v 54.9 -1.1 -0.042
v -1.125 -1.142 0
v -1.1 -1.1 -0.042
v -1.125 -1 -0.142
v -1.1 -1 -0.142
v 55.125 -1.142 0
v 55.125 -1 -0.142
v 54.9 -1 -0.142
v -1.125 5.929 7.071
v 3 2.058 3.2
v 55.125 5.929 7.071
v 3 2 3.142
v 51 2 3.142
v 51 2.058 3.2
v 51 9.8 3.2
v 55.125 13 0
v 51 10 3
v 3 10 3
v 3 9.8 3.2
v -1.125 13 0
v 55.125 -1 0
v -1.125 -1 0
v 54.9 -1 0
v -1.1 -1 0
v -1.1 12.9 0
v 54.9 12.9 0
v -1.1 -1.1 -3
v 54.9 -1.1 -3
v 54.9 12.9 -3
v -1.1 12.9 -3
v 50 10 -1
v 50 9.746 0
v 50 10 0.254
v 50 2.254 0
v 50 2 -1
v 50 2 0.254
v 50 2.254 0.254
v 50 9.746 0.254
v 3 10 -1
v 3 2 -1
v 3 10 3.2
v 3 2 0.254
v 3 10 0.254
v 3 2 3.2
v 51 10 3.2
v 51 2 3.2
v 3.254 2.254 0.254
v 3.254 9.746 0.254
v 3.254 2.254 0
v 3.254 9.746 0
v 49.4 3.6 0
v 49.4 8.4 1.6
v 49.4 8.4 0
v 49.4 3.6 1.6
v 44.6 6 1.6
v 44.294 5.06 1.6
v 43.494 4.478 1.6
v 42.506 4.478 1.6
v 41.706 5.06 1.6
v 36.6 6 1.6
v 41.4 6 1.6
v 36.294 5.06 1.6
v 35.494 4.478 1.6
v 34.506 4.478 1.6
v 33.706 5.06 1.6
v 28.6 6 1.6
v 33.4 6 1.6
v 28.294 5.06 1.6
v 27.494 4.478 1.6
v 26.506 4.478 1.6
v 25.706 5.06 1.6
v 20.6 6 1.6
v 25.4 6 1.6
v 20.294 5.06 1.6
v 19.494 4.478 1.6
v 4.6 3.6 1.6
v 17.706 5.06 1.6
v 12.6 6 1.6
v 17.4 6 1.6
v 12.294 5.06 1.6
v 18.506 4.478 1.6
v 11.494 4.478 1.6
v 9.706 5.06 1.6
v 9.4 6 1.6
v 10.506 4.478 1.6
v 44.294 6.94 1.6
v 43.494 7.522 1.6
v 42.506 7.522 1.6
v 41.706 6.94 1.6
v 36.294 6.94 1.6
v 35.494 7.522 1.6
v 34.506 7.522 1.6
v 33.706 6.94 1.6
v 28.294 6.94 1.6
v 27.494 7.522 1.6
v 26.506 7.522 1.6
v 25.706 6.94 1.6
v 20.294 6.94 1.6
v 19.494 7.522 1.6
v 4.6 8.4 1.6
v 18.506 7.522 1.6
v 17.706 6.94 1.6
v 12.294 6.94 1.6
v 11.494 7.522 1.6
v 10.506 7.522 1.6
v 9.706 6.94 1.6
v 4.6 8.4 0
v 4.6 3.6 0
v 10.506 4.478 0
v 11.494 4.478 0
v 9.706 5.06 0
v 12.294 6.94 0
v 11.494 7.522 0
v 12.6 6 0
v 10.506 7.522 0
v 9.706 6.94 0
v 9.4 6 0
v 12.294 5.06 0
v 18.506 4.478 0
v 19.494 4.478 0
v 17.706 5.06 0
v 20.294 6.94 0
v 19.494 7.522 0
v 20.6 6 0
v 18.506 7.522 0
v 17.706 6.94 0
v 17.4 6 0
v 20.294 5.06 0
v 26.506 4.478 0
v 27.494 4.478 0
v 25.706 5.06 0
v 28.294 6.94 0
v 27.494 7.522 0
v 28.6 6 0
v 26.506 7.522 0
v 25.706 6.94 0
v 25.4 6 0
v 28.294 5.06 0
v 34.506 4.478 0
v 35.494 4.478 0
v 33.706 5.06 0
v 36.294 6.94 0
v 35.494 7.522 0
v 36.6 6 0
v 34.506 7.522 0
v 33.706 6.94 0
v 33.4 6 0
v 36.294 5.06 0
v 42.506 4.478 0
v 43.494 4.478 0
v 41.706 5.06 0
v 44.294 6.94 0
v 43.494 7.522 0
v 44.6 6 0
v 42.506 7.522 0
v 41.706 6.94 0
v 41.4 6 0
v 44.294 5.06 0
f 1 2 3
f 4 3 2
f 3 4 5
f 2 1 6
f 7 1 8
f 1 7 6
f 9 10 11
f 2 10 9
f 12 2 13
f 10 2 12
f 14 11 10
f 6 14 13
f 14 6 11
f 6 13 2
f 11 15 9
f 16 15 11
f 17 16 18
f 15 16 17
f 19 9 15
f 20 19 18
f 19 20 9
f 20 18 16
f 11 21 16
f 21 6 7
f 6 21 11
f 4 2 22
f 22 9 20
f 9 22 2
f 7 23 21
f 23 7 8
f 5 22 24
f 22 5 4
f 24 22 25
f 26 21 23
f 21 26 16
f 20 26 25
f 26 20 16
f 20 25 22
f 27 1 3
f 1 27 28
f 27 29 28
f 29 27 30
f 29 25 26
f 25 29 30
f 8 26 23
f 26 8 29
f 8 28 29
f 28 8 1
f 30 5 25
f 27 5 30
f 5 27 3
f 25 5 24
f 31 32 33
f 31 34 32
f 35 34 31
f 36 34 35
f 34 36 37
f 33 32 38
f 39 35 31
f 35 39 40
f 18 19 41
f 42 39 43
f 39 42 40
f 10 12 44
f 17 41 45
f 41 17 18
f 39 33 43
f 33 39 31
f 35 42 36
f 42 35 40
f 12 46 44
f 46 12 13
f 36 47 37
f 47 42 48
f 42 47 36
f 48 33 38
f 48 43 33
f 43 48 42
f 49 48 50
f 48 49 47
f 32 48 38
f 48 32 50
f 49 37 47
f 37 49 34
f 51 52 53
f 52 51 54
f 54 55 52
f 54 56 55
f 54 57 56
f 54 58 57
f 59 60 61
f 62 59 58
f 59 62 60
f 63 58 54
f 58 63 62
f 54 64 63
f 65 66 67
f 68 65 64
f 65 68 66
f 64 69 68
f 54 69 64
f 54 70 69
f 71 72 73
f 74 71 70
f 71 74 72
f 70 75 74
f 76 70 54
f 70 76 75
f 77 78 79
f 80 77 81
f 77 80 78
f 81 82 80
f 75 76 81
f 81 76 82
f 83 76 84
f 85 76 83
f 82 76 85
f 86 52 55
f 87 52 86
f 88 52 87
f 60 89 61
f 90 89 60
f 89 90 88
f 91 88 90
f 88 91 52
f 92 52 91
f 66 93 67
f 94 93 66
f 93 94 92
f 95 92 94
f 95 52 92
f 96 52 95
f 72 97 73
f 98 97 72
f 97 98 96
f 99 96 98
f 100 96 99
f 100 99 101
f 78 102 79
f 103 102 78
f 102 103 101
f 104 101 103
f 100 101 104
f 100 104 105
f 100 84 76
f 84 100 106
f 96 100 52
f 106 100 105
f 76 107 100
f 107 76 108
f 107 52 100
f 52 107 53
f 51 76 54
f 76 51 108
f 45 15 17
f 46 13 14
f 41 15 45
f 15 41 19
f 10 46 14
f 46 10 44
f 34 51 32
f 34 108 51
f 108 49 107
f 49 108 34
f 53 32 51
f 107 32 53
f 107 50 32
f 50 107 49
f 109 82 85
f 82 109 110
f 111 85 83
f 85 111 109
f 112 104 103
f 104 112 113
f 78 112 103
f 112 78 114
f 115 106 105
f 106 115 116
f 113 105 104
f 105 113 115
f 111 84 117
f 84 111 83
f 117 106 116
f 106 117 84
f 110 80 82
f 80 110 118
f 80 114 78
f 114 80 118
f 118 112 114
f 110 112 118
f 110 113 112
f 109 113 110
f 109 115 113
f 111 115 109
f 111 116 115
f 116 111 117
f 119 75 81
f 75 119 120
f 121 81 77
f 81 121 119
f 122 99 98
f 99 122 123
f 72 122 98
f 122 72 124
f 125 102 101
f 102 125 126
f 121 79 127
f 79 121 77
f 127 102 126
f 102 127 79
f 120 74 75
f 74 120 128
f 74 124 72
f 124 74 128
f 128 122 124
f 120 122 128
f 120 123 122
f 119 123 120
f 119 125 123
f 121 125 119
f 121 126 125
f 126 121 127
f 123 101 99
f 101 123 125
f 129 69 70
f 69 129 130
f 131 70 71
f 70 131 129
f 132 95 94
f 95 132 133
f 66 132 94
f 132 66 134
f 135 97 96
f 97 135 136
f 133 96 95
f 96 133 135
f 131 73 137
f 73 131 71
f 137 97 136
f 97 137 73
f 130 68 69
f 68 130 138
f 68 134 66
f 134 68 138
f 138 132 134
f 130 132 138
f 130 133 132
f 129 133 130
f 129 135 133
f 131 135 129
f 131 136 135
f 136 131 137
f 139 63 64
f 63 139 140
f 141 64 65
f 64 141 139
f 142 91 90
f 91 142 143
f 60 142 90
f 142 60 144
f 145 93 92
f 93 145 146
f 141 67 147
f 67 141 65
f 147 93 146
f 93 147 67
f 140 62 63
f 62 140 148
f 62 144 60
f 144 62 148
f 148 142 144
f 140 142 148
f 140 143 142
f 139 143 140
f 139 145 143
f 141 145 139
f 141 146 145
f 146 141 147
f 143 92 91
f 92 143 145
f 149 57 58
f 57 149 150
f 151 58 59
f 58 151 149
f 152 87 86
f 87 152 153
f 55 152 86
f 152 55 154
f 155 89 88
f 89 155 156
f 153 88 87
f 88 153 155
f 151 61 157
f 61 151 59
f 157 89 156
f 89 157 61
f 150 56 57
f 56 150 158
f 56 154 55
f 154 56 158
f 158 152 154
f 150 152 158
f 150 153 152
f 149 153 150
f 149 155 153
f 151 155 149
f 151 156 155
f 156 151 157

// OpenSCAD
// file: ../OpenSCAD/brailleAndText.scad
/*
Braille Module
http://creativecommons.org/licenses/by/3.0/
*/


// mm sizes from http://dots.physics.orst.edu/gs_layout.html
radius = 0.25;
spacing = 2.5;
startOffset = 3.75;
distance = startOffset + spacing;

plate_height = 10;
plate_thickness = 10;   // was 2.

$fn = 10;



module letter(bitmap, char) {
//    echo(char);
	row_size = 2;
	col_size = 3;
	bitmap_size = row_size * col_size;
	
	function loc_x(loc) = floor(loc / row_size) * spacing + spacing;
	function loc_y(loc) = loc % row_size * spacing  + (distance-spacing)/2;

    translate([0, loc_y(-1), -2]) {
        rotate([270, 0, 90]) {
            linear_extrude(height = 1.25)
            text(char, 6);
        }
    }
	
    for (loc = [0:bitmap_size - 1]) {
		if (bitmap[loc] != 0) {
			union() {
				translate(v = [loc_x(loc), loc_y(loc), 0]) {
					sphere(radius = radius* bitmap[loc], center = true);
				}
			}
		}
	}
}


module braille_char(char) {
	if (char == "A" || char == "a") {
		letter([
			1,0,
			0,0,
			0,0
		], char);
	} else if (char == "B" || char == "b") {
		letter([
			1,0,
			1,0,
			0,0
		], char);
	} else if (char == "C" || char == "c") {
		letter([
			1,1,
			0,0,
			0,0
		], char);
	} else if (char == "D" || char == "d") {
		letter([
			1,1,
			0,1,
			0,0
		], char);
	} else if (char == "E" || char == "e") {
		letter([
			1,0,
			0,1,
			0,0
		], char);
	} else if (char == "F" || char == "f") {
		letter([
			1,1,
			1,0,
			0,0
		], char);
	} else if (char == "G" || char == "g") {
		letter([
			1,1,
			1,1,
			0,0
		], char);
	} else if (char == "H" || char == "h") {
		letter([
			1,0,
			1,1,
			0,0
		], char);
	} else if (char == "I" || char == "i") {
		letter([
			0,1,
			1,0,
			0,0
		], char);
	} else if (char == "J" || char == "j") {
		letter([
			0,1,
			1,1,
			0,0
		], char);
	} else if (char == "K" || char == "k") {
		letter([
			1,0,
			0,0,
			1,0
		], char);
	} else if (char == "L" || char == "l") {
		letter([
			1,0,
			1,0,
			1,0
		], char);
	} else if (char == "M" || char == "m") {
		letter([
			1,1,
			0,0,
			1,0
		], char);
	} else if (char == "N" || char == "n") {
		letter([
			1,1,
			0,1,
			1,0
		], char);
	} else if (char == "O" || char == "o") {
		letter([
			1,0,
			0,1,
			1,0
		], char);
	} else if (char == "P" || char == "p") {
		letter([
			1,1,
			1,0,
			1,0
		], char);
	} else if (char == "Q" || char == "q") {
		letter([
			1,1,
			1,1,
			1,0
		], char);
	} else if (char == "R" || char == "r") {
		letter([
			1,0,
			1,1,
			1,0
		], char);
	} else if (char == "S" || char == "s") {
		letter([
			0,1,
			1,0,
			1,0
		], char);
	} else if (char == "T" || char == "t") {
		letter([
			0,1,
			1,1,
			1,0
		], char);
	} else if (char == "U" || char == "u") {
		letter([
			1,0,
			0,0,
			1,1
		], char);
	} else if (char == "V" || char == "v") {
		letter([
			1,0,
			1,1,
			1,0
		], char);
	} else if (char == "W" || char == "w") {
		letter([
			0,1,
			1,1,
			0,1
		], char);
	} else if (char == "X" || char == "x") {
		letter([
			1,1,
			0,0,
			1,1
		], char);
	} else if (char == "Y" || char == "y") {
		letter([
			1,1,
			0,1,
			1,1
		], char);
	} else if (char == "Z" || char == "z") {
		letter([
			1,0,
			0,1,
			1,1
		], char);
    } else if (char == " ") {
		letter([
			0,0,
			0,0,
			0,0
		], char);
	} else {
		echo("Invalid Character: ", char);
	}

}

module braille_str(chars) {
    char_count = len(chars);
	echo(str("Total Width of ", chars, " : ",  distance * char_count, "mm"));
	union() {
		for (count = [0:char_count-1]) {
			translate(v = [0, count * distance, plate_thickness]) {
				braille_char(chars[count]);
			}
		}
		translate(v = [0, -distance/2, 0]) {
			color([0,0,1]) {
				cube(size = [plate_height, distance * (char_count+1), plate_thickness]);
			}
            }                                                      
	}
}

function lenText(txt="Hi") = distance * len(txt);

module printTextAndBraille(textToPrint) {
    blockLen = lenText(textToPrint);
    union()
    {
        difference() {                      // remove second box from first
            rotate([0,45,0]) {              // make it on its edge
                braille_str((textToPrint)); // make a long box
            }
            translate([0, -3.25, -8]) {     // move in right place
                cube(size = [14, (blockLen+8), 8]);
            }
        } 
        translate([0.1, -3.1, -3]) {     // move in right place
            cube(size = [14, (blockLen+6), 3]); 
        }
    }                                 
}

printTextAndBraille("HELLO CalLUM");
// file: ../openSCADLibs/lego_brick_builder.scad
/*

 Basic Lego brick builder module for OpenScad by Jorg Janssen 2013 (CC BY-NC 3.0) 
 To use this in your own projects add:

 use <path_to_this_file/lego_brick_builder.scad>
 brick (length, width, height [,smooth]);

 Length and width are in standard lego brick dimensions. 
 Height is in flat brick heights, so for a normal lego brick height = 3.
 Add optional smooth = true for a brick without studs. 
 Use height = 0 to just put studs/knobs on top of other things.

 */
$fn = 150;

// and this is how it's done:

FLU = 1.6; // Fundamental Lego Unit = 1.6 mm

BRICK_WIDTH = 5*FLU; // basic brick width
BRICK_HEIGHT = 6*FLU; // basic brick height
PLATE_HEIGHT = 2*FLU; // basic plate height
WALL_THICKNESS = FLU; // outer wall of the brick
STUD_RADIUS = 1.5*FLU; // studs are the small cylinders on top of the brick with the lego logo ('nopje' in Dutch)
STUD_HEIGHT = FLU; 
ANTI_STUD_RADIUS = 0.5*4.07*FLU;  // an anti stud is the hollow cylinder inside bricks that have length > 1 and width > 1
PIN_RADIUS = FLU; // a pin is the small cylinder inside bricks that have length = 1 or width = 1
SUPPORT_THICKNESS = 0.254; // support is the thin surface between anti studs, pins and walls, your printer might not print this thin, try thicker!
EDGE = 0.254; // this is the width and height of the bottom line edge of smooth bricks
CORRECTION = 0.1; // addition to each size, to make sure all parts connect by moving them a little inside each other

module brick(length = 4, width = 2, height = 3, smooth = false){

	// brick shell
	difference(){
		cube(size = [length*BRICK_WIDTH,width*BRICK_WIDTH,height*PLATE_HEIGHT]);
		translate([WALL_THICKNESS,WALL_THICKNESS,-WALL_THICKNESS])
		union(){
			cube(size = [length*BRICK_WIDTH-2*WALL_THICKNESS,width*BRICK_WIDTH-2*WALL_THICKNESS,height*PLATE_HEIGHT]);
			// stud inner holes, radius = pin radius
			if (!smooth) {
				translate([STUD_RADIUS+WALL_THICKNESS,STUD_RADIUS+WALL_THICKNESS,height*PLATE_HEIGHT])
				for (y = [0:width-1]){
					for (x = [0:length-1]){
						translate ([x*BRICK_WIDTH-WALL_THICKNESS,y*BRICK_WIDTH-WALL_THICKNESS,-CORRECTION])
						cylinder(h=WALL_THICKNESS+2*CORRECTION,r=PIN_RADIUS);
					}
				}
			}
			// small bottom line edge for smooth bricks
			else {
				translate([-WALL_THICKNESS-CORRECTION,-WALL_THICKNESS-CORRECTION,FLU-CORRECTION]) 
				difference() {
					cube([length*BRICK_WIDTH+2*CORRECTION,width*BRICK_WIDTH+2*CORRECTION,EDGE+CORRECTION]);
					translate([EDGE+CORRECTION,EDGE+CORRECTION,-CORRECTION])
					cube([length*BRICK_WIDTH-2*EDGE,width*BRICK_WIDTH-2*EDGE,EDGE+3*CORRECTION]); 
				}
			}
		}
	}
	// Studs
	if(!smooth){
		translate([STUD_RADIUS+WALL_THICKNESS,STUD_RADIUS+WALL_THICKNESS,height*PLATE_HEIGHT])
		for (y = [0:width-1]){
			for (x = [0:length-1]){
				translate ([x*BRICK_WIDTH,y*BRICK_WIDTH,-CORRECTION])
				difference(){
					cylinder(h=STUD_HEIGHT+CORRECTION, r=STUD_RADIUS);
					// Stud inner holes
					translate([0,0,-CORRECTION])
					cylinder(h=0.5*STUD_HEIGHT+CORRECTION,r=PIN_RADIUS);
				}
				// tech logo - disable this if your printer isn't capable of printing this small
				if ( length > width){
					translate([x*BRICK_WIDTH+0.8,y*BRICK_WIDTH-1.9,STUD_HEIGHT-CORRECTION])
					resize([1.2*1.7,2.2*1.7,0.254+CORRECTION])
					rotate(a=[0,0,90])
					import("tech.stl");
				}
				else {
					translate([x*BRICK_WIDTH-1.9,y*BRICK_WIDTH-0.8,STUD_HEIGHT-CORRECTION])
					resize([2.2*1.7,1.2*1.7,0.254+CORRECTION])
					import("tech.stl");				
				}				
				/* 
				// Alternative 2-square logo
				translate ([x*BRICK_WIDTH+CORRECTION,y*BRICK_WIDTH-CORRECTION,STUD_HEIGHT-CORRECTION])		
				cube([1,1,2*CORRECTION]);
				translate ([x*BRICK_WIDTH-0.9,y*BRICK_WIDTH-0.9,STUD_HEIGHT-CORRECTION])		
				cube([1,1,0.3]);
				*/				
			}
		}
	}
	// Pins x
	if (width == 1 && length > 1) {	
			for (x = [1:length-1]){
				translate([x*BRICK_WIDTH,0.5*BRICK_WIDTH,0])
				cylinder(h=height*PLATE_HEIGHT-WALL_THICKNESS+CORRECTION,r=PIN_RADIUS);
				// Supports
				if (height > 1) {
				translate([x*BRICK_WIDTH-0.5*SUPPORT_THICKNESS,CORRECTION,STUD_HEIGHT])
				cube(size=[SUPPORT_THICKNESS,BRICK_WIDTH-2*CORRECTION,height*PLATE_HEIGHT-STUD_HEIGHT-WALL_THICKNESS+CORRECTION]);
			}
		}
	}
	// Pins y
	if (length == 1 && width > 1) {	
			for (y = [1:width-1]){
			translate([0.5*BRICK_WIDTH,y*BRICK_WIDTH,0])
			cylinder(h=height*PLATE_HEIGHT-WALL_THICKNESS+CORRECTION,r=PIN_RADIUS);
			// Supports
			if (height > 1) {
			translate([CORRECTION,y*BRICK_WIDTH-0.5*SUPPORT_THICKNESS,STUD_HEIGHT])
			cube(size=[BRICK_WIDTH-2*CORRECTION,SUPPORT_THICKNESS,height*PLATE_HEIGHT-STUD_HEIGHT-WALL_THICKNESS+CORRECTION]);}
			
		}
	}
	// Anti Studs
	if (width > 1 && length > 1){
		difference(){
			union(){
				for(y = [1:width-1]){
					for(x = [1:length-1]){
						// anti studs
						translate([x*BRICK_WIDTH,y*BRICK_WIDTH,0])
						cylinder (h=height*PLATE_HEIGHT-WALL_THICKNESS+CORRECTION, r = ANTI_STUD_RADIUS);
						// Supports
						if (height > 1){
							// Support x
							if (x%2 == 0 && (length%2 == 0 || length%4 == 1 && x<length/2 || length%4 == 3 && x>length/2) || x%2 == 1 && (length%4 == 3 && x<length/2 || length%4 == 1 && x>length/2)) {
								translate([BRICK_WIDTH*x-0.5*SUPPORT_THICKNESS,y*BRICK_WIDTH-BRICK_WIDTH+WALL_THICKNESS-CORRECTION,STUD_HEIGHT])
								cube(size=[SUPPORT_THICKNESS,2*BRICK_WIDTH-2*WALL_THICKNESS,height*PLATE_HEIGHT-STUD_HEIGHT-WALL_THICKNESS+CORRECTION]);
							}
							// Supports y							
							if (y%2 == 0 && (width%2 == 0 || width%4 == 1 && y<width/2 || width%4 == 3 && y>width/2) || y%2 == 1 && (width%4 == 3 && y<width/2 || width%4 == 1 && y>width/2)) {
								translate([x*BRICK_WIDTH-BRICK_WIDTH+WALL_THICKNESS-CORRECTION,BRICK_WIDTH*y-0.5*SUPPORT_THICKNESS,STUD_HEIGHT])
								cube(size=[2*BRICK_WIDTH-2*WALL_THICKNESS,SUPPORT_THICKNESS,height*PLATE_HEIGHT-STUD_HEIGHT-WALL_THICKNESS+CORRECTION]);
							}
						}
					}
				}
			}
			union(){
				for(y = [1:width-1]){
					for(x = [1:length-1]){
						// hollow anti studs
						translate([x*BRICK_WIDTH,y*BRICK_WIDTH,-WALL_THICKNESS])
						cylinder (h=height*PLATE_HEIGHT, r = STUD_RADIUS);				
					}
				}
			}
		}		
	}
}
	
// file: ../OpenSCAD/TextAndBrailleLegoBlock.scad
 include <../openSCADLibs/lego_brick_builder.scad>
 include <../OpenSCAD/brailleAndText.scad>;

module brickAndText(text) {
    txtLen = distance * len(text);
    echo(distance);
    difference() {
        rotate([180,180,90])
            translate([-13, 2, 0])
                printTextAndBraille(text);
        translate([3, 2, -1]) 
            cube([txtLen - 3, BRICK_WIDTH, 4]);
    }
    translate([3,2,0])
        brick(floor(txtLen / BRICK_WIDTH),1,1, true);    
}

// use <../BPNodesV2/TextNBraille.scad>
//brickAndText("This is a test string");  
// main file
use <../OpenSCAD/TextAndBrailleLegoBlock.scad>

brickAndText("        ");
